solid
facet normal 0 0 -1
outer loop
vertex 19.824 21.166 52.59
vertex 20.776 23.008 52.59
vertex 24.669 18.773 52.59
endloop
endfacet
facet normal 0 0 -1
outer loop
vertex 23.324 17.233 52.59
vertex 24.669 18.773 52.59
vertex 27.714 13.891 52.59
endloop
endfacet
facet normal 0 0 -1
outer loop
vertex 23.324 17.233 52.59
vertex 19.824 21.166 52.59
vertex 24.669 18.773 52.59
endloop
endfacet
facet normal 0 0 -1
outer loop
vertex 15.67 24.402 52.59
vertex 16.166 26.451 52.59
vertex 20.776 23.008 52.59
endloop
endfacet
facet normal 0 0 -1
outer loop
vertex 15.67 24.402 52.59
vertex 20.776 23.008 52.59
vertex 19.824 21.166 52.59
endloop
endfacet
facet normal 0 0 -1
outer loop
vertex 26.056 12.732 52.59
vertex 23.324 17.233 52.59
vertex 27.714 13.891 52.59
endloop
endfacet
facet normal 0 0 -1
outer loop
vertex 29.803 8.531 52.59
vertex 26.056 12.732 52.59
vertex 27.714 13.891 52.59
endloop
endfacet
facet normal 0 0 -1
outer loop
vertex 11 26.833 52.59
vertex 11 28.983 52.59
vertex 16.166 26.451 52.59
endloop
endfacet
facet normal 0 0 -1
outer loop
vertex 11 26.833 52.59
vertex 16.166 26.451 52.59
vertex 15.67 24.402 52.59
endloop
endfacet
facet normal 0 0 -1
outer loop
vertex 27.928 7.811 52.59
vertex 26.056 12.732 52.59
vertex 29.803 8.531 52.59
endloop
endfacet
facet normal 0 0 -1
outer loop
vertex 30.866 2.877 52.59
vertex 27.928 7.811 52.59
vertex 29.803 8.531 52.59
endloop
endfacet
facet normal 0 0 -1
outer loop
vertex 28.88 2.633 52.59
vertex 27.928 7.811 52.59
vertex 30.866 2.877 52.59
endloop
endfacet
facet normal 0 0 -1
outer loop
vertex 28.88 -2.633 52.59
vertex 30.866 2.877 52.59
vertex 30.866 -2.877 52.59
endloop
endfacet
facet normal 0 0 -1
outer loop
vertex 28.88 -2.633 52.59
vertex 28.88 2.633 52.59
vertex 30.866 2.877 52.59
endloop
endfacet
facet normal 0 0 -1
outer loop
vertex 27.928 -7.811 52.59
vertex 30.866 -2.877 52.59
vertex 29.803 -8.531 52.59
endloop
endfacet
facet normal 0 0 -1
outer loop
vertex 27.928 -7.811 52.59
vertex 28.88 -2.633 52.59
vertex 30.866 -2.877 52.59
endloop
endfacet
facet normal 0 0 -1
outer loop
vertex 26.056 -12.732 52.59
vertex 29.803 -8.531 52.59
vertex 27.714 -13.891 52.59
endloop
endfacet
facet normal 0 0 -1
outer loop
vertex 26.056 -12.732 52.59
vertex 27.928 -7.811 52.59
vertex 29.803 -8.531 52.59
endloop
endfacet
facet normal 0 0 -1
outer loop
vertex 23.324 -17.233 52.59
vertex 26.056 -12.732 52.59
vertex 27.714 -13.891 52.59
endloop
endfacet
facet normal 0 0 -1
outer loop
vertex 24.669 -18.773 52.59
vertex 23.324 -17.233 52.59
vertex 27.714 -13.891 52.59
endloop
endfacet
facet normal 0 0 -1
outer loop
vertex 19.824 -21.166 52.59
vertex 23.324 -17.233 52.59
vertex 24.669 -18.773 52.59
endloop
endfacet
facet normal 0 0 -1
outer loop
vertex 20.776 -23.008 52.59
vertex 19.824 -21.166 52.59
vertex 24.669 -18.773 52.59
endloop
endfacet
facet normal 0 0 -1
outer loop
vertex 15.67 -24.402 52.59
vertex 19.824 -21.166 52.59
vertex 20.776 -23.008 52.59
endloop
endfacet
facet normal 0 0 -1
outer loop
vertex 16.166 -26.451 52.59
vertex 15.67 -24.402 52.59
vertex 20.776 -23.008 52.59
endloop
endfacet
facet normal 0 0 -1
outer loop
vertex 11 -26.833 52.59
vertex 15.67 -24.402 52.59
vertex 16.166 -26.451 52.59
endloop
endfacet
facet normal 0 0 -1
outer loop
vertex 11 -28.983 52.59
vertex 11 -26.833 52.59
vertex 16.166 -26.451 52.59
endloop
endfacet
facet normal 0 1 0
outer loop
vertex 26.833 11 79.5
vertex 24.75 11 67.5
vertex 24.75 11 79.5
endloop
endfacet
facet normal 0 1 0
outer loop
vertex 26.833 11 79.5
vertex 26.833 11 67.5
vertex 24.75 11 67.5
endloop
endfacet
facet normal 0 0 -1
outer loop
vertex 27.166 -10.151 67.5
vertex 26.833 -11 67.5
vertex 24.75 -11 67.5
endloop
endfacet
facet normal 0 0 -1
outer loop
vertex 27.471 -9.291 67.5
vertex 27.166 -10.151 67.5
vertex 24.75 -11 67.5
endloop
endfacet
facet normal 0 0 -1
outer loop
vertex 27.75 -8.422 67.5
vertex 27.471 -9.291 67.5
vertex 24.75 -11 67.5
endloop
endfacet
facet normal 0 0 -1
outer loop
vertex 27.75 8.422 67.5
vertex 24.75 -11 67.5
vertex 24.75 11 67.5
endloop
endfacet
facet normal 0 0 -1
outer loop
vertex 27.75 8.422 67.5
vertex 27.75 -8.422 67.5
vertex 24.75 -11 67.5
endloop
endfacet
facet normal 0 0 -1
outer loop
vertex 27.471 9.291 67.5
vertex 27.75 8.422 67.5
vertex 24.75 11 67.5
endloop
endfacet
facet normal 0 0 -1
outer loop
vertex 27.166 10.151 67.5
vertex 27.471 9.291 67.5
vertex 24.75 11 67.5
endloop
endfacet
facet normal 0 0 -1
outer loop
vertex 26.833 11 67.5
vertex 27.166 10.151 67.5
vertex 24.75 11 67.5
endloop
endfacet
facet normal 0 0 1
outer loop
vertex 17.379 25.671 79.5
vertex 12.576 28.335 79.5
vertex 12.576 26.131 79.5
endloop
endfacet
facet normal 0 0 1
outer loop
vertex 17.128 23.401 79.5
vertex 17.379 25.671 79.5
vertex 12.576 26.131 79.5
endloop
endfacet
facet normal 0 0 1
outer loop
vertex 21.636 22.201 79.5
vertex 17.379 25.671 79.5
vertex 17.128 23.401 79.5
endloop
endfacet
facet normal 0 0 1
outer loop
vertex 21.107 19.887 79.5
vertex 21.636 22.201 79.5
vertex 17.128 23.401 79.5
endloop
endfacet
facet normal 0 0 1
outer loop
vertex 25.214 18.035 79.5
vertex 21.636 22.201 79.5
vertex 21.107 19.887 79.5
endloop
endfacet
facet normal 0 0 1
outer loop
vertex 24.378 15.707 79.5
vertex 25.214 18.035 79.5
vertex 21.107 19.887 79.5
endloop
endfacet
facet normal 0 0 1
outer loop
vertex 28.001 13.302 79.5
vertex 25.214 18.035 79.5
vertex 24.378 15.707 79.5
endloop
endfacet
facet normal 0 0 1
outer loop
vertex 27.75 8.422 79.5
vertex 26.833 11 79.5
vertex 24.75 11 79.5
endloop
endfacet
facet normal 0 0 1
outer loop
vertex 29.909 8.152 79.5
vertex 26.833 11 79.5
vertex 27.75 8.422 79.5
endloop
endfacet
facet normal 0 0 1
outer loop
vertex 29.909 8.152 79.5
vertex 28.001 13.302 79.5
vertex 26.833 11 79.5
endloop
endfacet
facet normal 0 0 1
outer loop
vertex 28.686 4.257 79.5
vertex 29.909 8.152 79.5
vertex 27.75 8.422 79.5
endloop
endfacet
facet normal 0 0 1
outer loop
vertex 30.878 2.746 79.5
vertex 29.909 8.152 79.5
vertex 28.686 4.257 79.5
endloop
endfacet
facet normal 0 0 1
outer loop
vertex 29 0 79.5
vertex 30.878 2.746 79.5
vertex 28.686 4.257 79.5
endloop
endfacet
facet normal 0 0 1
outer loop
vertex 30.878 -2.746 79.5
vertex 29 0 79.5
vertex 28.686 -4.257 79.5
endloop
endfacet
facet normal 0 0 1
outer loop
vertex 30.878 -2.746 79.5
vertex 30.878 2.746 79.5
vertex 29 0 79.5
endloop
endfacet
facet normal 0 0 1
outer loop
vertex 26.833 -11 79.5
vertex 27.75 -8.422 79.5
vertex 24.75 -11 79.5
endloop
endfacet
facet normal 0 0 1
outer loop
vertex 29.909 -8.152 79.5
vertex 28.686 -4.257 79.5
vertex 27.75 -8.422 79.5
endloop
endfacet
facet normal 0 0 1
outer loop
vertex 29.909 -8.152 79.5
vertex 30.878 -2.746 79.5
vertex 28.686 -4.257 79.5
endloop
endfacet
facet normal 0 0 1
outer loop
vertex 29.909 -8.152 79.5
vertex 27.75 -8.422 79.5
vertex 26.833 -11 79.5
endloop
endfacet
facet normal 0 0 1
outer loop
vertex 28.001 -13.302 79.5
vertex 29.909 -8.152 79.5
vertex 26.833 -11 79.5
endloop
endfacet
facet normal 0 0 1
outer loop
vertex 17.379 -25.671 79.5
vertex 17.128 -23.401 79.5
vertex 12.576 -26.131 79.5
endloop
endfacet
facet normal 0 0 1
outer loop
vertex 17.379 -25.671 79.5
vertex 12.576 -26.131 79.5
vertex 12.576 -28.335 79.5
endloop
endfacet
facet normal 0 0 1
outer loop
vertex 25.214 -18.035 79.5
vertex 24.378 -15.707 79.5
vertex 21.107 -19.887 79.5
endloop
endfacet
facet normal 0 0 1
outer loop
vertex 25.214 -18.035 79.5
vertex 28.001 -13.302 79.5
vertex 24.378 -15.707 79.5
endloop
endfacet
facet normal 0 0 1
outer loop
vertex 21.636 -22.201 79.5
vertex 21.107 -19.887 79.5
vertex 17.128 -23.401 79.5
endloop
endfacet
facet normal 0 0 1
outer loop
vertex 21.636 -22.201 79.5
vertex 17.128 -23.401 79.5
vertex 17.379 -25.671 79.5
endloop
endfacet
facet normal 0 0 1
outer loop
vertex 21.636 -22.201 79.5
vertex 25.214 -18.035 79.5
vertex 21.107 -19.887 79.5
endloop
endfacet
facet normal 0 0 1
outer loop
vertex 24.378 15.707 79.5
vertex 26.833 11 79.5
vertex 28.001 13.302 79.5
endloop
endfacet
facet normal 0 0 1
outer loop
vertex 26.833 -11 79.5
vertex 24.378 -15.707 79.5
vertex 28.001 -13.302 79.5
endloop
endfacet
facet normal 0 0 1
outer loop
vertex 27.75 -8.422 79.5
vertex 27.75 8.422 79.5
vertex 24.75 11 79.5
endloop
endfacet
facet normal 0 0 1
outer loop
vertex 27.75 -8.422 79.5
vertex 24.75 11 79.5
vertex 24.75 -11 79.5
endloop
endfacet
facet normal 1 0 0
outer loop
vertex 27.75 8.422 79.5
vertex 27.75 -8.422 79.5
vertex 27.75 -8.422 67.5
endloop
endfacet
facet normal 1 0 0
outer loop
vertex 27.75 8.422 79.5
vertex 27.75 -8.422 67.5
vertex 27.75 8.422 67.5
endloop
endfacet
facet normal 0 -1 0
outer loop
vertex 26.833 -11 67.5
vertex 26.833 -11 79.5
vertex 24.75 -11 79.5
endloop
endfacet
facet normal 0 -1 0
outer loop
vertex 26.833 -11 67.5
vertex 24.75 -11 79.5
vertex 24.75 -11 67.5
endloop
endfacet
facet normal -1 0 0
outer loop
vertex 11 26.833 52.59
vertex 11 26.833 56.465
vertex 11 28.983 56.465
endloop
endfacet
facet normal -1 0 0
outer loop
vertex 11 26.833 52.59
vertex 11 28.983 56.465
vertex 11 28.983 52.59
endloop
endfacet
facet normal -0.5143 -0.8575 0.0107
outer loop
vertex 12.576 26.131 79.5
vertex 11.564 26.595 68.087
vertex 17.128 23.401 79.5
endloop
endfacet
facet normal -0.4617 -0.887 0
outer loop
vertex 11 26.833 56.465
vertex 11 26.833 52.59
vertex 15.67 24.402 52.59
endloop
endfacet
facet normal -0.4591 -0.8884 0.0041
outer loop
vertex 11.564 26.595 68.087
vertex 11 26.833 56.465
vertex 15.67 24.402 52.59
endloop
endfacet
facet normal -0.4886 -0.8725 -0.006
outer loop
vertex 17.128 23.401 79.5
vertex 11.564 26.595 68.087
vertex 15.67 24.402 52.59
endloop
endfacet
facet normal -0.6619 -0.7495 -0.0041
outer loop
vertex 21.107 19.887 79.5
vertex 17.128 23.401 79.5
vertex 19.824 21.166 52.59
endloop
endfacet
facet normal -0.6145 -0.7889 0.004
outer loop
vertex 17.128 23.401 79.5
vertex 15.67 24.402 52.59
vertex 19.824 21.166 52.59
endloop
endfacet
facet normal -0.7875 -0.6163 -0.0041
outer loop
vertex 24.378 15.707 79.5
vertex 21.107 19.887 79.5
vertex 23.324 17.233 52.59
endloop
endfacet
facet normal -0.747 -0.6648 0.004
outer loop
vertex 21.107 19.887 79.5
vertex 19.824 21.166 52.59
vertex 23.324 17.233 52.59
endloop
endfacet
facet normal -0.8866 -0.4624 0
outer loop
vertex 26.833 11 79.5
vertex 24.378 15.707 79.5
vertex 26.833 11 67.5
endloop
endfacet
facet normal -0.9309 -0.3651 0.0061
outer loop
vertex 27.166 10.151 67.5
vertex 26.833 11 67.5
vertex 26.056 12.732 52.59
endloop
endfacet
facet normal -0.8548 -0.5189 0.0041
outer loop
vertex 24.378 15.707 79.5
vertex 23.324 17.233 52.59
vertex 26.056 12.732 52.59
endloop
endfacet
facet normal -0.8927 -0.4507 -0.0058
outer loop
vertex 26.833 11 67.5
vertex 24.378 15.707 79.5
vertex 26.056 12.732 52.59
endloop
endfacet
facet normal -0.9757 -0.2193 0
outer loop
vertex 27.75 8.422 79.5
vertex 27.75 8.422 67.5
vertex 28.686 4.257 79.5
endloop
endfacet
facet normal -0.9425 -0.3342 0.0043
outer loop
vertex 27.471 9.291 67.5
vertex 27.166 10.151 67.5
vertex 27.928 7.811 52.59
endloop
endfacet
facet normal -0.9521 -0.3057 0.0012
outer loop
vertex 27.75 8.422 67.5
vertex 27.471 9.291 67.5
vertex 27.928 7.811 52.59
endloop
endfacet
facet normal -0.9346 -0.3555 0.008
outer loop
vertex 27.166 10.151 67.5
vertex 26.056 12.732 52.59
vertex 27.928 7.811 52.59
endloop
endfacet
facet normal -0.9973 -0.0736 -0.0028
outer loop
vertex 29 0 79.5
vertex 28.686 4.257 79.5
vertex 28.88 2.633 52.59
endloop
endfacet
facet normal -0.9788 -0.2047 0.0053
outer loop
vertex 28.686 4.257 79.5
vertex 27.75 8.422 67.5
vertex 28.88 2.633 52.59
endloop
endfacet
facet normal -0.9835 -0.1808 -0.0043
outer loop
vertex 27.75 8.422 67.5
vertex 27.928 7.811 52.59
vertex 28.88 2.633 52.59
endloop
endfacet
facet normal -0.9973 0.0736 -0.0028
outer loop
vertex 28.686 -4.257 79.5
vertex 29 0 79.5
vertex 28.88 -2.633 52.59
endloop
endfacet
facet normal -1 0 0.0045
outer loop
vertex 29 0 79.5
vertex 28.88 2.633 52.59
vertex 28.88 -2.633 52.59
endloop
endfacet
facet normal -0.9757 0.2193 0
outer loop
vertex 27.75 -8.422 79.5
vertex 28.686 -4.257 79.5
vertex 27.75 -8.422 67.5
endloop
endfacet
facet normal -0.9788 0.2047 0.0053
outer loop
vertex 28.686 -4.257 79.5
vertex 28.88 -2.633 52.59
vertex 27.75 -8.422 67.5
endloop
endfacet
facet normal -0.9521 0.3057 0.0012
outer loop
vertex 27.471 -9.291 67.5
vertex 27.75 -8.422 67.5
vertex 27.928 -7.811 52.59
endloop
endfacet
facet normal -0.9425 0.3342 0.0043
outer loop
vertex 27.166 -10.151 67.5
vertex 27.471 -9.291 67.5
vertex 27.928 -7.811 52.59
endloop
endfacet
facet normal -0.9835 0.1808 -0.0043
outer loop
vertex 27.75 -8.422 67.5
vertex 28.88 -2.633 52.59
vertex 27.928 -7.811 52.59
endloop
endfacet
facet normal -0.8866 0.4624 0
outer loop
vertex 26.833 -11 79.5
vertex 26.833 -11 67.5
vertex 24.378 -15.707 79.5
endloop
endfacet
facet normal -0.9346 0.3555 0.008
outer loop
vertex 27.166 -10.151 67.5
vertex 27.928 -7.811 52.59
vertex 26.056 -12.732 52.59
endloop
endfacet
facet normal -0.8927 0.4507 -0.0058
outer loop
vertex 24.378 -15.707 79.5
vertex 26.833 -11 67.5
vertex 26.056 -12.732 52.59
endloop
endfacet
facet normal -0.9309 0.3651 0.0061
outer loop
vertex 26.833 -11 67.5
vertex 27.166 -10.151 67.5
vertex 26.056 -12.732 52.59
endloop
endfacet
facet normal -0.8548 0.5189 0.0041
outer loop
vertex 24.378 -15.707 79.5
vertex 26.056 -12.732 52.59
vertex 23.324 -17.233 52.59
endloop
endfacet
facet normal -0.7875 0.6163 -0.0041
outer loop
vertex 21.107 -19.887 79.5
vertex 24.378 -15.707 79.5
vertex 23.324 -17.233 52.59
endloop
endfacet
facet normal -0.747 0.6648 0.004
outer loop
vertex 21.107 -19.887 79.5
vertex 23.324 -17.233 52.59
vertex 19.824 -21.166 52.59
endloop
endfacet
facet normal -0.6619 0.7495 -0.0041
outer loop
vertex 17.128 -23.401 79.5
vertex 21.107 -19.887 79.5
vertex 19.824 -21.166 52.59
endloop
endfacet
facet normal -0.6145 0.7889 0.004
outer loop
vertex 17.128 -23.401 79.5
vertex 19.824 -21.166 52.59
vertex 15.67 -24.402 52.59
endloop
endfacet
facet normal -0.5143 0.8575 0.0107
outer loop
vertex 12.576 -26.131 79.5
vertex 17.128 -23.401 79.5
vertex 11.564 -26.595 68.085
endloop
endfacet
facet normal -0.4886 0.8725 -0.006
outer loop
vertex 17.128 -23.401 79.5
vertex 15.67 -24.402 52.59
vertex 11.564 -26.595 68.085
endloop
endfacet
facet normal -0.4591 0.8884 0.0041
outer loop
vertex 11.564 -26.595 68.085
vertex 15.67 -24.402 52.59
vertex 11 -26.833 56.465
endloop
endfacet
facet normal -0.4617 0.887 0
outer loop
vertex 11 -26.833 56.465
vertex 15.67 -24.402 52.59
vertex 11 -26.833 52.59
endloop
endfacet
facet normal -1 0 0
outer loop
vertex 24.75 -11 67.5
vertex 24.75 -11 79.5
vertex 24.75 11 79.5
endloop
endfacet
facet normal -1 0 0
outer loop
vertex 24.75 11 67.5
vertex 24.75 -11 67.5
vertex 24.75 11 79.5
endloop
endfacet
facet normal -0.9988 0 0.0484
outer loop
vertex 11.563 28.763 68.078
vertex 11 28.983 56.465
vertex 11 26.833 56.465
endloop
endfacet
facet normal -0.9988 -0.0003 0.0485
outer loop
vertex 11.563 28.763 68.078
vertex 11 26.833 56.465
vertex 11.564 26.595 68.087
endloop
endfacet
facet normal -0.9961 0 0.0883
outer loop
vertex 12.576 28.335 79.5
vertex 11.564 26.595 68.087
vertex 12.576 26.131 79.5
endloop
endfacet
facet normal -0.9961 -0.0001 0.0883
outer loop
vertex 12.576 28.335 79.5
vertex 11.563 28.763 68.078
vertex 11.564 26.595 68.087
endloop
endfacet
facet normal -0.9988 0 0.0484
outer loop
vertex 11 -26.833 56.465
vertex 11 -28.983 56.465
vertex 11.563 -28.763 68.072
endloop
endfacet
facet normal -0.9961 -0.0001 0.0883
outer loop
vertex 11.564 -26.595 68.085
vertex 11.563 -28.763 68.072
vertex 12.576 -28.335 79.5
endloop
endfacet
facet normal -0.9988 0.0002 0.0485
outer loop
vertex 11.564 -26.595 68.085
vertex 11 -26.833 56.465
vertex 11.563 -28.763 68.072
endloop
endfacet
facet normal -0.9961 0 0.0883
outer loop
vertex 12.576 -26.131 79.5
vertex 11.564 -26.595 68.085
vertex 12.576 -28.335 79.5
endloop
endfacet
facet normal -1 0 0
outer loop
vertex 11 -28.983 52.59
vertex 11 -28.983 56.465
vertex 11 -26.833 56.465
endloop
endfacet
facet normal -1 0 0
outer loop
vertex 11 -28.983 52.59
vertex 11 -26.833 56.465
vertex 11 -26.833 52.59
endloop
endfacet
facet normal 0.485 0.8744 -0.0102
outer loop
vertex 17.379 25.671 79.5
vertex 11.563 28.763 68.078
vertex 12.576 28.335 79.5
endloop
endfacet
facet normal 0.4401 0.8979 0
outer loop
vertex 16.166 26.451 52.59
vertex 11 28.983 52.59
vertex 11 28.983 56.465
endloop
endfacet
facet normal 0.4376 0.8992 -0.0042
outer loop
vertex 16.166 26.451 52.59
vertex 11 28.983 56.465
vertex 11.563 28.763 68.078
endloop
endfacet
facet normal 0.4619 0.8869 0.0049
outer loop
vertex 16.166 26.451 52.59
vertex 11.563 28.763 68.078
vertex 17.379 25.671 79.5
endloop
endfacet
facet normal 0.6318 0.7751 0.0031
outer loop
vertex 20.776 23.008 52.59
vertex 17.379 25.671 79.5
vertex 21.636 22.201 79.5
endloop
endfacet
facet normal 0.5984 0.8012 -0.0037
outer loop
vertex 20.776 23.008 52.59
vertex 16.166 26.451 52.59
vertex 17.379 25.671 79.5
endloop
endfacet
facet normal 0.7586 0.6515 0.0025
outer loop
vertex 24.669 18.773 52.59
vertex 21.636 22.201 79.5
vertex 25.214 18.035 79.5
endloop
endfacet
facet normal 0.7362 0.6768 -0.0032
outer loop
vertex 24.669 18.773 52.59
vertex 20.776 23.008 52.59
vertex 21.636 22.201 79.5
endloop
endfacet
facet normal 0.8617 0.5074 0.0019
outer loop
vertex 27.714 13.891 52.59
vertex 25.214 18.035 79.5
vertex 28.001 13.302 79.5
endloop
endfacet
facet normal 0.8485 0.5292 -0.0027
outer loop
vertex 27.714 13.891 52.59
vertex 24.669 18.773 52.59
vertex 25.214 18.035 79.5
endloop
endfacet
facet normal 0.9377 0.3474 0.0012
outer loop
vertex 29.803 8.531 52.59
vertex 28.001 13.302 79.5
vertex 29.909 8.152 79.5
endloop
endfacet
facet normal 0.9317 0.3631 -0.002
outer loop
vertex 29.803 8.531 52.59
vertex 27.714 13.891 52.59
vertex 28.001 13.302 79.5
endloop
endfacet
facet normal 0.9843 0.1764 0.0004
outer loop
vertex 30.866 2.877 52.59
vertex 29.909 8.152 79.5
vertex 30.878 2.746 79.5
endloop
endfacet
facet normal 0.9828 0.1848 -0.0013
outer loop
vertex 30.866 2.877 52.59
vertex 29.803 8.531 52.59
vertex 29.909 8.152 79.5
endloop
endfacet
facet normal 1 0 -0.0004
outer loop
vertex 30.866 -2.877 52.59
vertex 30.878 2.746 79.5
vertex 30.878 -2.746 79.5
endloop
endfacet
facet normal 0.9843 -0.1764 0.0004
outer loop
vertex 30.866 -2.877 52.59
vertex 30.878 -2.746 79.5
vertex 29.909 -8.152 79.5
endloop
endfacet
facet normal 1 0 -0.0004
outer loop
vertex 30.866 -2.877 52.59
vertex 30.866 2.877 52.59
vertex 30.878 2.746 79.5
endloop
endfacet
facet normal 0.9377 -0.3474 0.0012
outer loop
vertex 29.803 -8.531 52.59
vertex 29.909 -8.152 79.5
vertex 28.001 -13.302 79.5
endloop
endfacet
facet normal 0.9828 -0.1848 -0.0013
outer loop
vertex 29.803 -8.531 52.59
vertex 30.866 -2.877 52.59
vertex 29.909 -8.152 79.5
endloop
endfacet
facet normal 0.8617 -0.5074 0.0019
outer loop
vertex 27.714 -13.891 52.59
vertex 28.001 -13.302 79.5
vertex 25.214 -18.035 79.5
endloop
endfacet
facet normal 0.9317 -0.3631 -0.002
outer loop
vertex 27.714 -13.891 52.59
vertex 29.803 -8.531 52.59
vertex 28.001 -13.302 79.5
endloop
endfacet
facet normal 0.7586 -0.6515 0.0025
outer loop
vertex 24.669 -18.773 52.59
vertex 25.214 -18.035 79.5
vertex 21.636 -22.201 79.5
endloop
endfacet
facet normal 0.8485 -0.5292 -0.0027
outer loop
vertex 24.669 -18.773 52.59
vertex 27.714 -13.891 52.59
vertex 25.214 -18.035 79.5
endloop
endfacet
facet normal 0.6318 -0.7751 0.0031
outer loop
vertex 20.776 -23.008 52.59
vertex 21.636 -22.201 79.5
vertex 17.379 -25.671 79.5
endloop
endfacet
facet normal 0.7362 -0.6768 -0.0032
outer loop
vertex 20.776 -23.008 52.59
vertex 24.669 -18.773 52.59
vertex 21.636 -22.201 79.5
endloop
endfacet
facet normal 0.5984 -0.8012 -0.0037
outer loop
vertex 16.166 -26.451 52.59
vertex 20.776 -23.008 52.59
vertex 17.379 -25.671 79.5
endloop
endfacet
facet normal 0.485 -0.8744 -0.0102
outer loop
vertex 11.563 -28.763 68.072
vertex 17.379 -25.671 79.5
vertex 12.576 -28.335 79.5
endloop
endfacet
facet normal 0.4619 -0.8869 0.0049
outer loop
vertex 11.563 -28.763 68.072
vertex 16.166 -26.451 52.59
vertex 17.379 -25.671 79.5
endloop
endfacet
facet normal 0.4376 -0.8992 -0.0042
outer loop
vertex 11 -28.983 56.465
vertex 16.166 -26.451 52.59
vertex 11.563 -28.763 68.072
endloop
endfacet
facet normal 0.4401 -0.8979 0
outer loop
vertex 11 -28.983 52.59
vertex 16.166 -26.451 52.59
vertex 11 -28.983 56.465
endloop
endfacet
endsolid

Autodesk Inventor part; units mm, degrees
ref_plane "XY Plane" through (0, 0, 0) normal (0, 0, 1) x (1, 0, 0)
sketch "Skizze1" plane through (0, 0, 0) normal (0, 0, 1) x (1, 0, 0)
  circle A0 centre (0, 0) radius 31
  circle A1 centre (0, 0) radius 29
  dimension "d0" = 62
  dimension "d1" = 58
extrude "Extrusion1" add sketch "Skizze1" along normal mid plane 300
sketch "Skizze2" plane through (0, 0, 0) normal (0, 1, 0) x (-1, 0, 0)
  line L0 (-11, 169.5773) -> (-11, -169.8146) construction
  line L1 (-74.8376, 0) -> (82.6362, 0) construction
  line L2 (-11, 75) -> (-11, -75)
  line L3 (-31, -150) -> (-31, 150) projected
  line L4 (31, 150) -> (-31, 150) projected
  line L5 (-31, -150) -> (31, -150) projected
  spline S0 degree 2 poles (-11, 75) (-17.8298, 136.4739) (-72.8449, 128.3193) knots 0 0 0 1 1 1
  spline S1 degree 2 poles (-11, -75) (-17.6171, -136.2673) (-74.8376, -130) knots 0 0 0 1 1 1
  line L6 (-72.8449, 128.3193) -> (-74.8376, -130)
  line L7 (-31, 120) -> (-31, 150)
  line L8 (-31, 150) -> (31, 150)
  line L9 (31, 150) -> (31, -150)
  line L10 (31, -150) -> (31, 150) projected
  line L11 (31, -150) -> (-31, -150)
  line L12 (-31, -150) -> (-31, -120)
  point P0 (0, 0)
  dimension "d4" = 11
  dimension "d5" = 150
  dimension "d6" = 30
  dimension "d7" = 30
extrude "Extrusion3" cut sketch "Skizze2" along normal mid plane 100 contours S0 L3 L4 L9 L5 S1 L2
ref_plane "Arbeitsebene3" through (0, 33.25, 0) normal (0, 1, 0) x (-1, 0, 0)
sketch "Skizze8" plane through (0, 33.25, 0) normal (0, 1, 0) x (-1, 0, 0)
  line L0 (-11, -75) -> (-11, 75) projected
  arc A0 (-11, 56.4646) -> (-14.2842, 92.4804) centre (-300.1138, 48.2584) ccw
  arc A1 (-11, 56.4646) -> (-14.2842, 92.4804) centre (-31.6354, 72.7405) ccw
  point P0 (0, 0)
extrude "Extrusion6" cut sketch "Skizze8" against normal blind 65
mirror "Spiegeln2" about plane through (0, 0, 0) normal (0, 0, 1) of "Extrusion6"
ref_plane "Arbeitsebene7" through (15, 0, 0) normal (1, 0, 0) x (0, 1, 0)
sketch "Skizze16" plane through (15, 0, 0) normal (1, 0, 0) x (0, 1, 0)
  line L0 (80.6197, 79.5) -> (-53.6874, 79.5) construction
  line L1 (57.2311, 79.5) -> (-60.0661, 79.5)
  line L2 (-60.0661, 79.5) -> (-60.0661, 136.8193)
  line L3 (-60.0661, 136.8193) -> (57.2311, 136.8193)
  line L4 (57.2311, 136.8193) -> (57.2311, 79.5)
  point P0 (0, 0)
  point P1 (0, 120)
  dimension "d83" = 40.5
extrude "Extrusion15" cut sketch "Skizze16" against normal mid plane 35
ref_plane "Arbeitsebene8" through (27.75, 0, 0) normal (1, 0, 0) x (0, 1, 0)
sketch "Skizze17" plane through (27.75, 0, 0) normal (1, 0, 0) x (0, 1, 0)
  line L0 (0, 106.4673) -> (0, -19.1283) construction
  line L1 (26.1314, 79.5) -> (-26.1314, 79.5) projected
  line L2 (11, 79.5) -> (-11, 79.5)
  line L3 (-11, 79.5) -> (-11, 67.5)
  line L4 (-11, 67.5) -> (11, 67.5)
  line L5 (11, 67.5) -> (11, 79.5)
  point P0 (0, 0)
  dimension "d87" = 12
  dimension "d88" = 22
extrude "Extrusion16" add sketch "Skizze17" against normal blind 3
sketch "Skizze18" plane through (15, 0, 0) normal (1, 0, 0) x (0, 1, 0)
  line L0 (36.302, 52.5896) -> (-53.6938, 52.5896)
  line L1 (-53.6938, 52.5896) -> (-53.6938, -134.0275)
  line L2 (-53.6938, -134.0275) -> (36.302, -134.0275)
  line L3 (36.302, -134.0275) -> (36.302, 52.5896)
  point P0 (0, 0)
extrude "Extrusion17" cut sketch "Skizze18" along normal mid plane 35
properties part number "_3D-Druck"
